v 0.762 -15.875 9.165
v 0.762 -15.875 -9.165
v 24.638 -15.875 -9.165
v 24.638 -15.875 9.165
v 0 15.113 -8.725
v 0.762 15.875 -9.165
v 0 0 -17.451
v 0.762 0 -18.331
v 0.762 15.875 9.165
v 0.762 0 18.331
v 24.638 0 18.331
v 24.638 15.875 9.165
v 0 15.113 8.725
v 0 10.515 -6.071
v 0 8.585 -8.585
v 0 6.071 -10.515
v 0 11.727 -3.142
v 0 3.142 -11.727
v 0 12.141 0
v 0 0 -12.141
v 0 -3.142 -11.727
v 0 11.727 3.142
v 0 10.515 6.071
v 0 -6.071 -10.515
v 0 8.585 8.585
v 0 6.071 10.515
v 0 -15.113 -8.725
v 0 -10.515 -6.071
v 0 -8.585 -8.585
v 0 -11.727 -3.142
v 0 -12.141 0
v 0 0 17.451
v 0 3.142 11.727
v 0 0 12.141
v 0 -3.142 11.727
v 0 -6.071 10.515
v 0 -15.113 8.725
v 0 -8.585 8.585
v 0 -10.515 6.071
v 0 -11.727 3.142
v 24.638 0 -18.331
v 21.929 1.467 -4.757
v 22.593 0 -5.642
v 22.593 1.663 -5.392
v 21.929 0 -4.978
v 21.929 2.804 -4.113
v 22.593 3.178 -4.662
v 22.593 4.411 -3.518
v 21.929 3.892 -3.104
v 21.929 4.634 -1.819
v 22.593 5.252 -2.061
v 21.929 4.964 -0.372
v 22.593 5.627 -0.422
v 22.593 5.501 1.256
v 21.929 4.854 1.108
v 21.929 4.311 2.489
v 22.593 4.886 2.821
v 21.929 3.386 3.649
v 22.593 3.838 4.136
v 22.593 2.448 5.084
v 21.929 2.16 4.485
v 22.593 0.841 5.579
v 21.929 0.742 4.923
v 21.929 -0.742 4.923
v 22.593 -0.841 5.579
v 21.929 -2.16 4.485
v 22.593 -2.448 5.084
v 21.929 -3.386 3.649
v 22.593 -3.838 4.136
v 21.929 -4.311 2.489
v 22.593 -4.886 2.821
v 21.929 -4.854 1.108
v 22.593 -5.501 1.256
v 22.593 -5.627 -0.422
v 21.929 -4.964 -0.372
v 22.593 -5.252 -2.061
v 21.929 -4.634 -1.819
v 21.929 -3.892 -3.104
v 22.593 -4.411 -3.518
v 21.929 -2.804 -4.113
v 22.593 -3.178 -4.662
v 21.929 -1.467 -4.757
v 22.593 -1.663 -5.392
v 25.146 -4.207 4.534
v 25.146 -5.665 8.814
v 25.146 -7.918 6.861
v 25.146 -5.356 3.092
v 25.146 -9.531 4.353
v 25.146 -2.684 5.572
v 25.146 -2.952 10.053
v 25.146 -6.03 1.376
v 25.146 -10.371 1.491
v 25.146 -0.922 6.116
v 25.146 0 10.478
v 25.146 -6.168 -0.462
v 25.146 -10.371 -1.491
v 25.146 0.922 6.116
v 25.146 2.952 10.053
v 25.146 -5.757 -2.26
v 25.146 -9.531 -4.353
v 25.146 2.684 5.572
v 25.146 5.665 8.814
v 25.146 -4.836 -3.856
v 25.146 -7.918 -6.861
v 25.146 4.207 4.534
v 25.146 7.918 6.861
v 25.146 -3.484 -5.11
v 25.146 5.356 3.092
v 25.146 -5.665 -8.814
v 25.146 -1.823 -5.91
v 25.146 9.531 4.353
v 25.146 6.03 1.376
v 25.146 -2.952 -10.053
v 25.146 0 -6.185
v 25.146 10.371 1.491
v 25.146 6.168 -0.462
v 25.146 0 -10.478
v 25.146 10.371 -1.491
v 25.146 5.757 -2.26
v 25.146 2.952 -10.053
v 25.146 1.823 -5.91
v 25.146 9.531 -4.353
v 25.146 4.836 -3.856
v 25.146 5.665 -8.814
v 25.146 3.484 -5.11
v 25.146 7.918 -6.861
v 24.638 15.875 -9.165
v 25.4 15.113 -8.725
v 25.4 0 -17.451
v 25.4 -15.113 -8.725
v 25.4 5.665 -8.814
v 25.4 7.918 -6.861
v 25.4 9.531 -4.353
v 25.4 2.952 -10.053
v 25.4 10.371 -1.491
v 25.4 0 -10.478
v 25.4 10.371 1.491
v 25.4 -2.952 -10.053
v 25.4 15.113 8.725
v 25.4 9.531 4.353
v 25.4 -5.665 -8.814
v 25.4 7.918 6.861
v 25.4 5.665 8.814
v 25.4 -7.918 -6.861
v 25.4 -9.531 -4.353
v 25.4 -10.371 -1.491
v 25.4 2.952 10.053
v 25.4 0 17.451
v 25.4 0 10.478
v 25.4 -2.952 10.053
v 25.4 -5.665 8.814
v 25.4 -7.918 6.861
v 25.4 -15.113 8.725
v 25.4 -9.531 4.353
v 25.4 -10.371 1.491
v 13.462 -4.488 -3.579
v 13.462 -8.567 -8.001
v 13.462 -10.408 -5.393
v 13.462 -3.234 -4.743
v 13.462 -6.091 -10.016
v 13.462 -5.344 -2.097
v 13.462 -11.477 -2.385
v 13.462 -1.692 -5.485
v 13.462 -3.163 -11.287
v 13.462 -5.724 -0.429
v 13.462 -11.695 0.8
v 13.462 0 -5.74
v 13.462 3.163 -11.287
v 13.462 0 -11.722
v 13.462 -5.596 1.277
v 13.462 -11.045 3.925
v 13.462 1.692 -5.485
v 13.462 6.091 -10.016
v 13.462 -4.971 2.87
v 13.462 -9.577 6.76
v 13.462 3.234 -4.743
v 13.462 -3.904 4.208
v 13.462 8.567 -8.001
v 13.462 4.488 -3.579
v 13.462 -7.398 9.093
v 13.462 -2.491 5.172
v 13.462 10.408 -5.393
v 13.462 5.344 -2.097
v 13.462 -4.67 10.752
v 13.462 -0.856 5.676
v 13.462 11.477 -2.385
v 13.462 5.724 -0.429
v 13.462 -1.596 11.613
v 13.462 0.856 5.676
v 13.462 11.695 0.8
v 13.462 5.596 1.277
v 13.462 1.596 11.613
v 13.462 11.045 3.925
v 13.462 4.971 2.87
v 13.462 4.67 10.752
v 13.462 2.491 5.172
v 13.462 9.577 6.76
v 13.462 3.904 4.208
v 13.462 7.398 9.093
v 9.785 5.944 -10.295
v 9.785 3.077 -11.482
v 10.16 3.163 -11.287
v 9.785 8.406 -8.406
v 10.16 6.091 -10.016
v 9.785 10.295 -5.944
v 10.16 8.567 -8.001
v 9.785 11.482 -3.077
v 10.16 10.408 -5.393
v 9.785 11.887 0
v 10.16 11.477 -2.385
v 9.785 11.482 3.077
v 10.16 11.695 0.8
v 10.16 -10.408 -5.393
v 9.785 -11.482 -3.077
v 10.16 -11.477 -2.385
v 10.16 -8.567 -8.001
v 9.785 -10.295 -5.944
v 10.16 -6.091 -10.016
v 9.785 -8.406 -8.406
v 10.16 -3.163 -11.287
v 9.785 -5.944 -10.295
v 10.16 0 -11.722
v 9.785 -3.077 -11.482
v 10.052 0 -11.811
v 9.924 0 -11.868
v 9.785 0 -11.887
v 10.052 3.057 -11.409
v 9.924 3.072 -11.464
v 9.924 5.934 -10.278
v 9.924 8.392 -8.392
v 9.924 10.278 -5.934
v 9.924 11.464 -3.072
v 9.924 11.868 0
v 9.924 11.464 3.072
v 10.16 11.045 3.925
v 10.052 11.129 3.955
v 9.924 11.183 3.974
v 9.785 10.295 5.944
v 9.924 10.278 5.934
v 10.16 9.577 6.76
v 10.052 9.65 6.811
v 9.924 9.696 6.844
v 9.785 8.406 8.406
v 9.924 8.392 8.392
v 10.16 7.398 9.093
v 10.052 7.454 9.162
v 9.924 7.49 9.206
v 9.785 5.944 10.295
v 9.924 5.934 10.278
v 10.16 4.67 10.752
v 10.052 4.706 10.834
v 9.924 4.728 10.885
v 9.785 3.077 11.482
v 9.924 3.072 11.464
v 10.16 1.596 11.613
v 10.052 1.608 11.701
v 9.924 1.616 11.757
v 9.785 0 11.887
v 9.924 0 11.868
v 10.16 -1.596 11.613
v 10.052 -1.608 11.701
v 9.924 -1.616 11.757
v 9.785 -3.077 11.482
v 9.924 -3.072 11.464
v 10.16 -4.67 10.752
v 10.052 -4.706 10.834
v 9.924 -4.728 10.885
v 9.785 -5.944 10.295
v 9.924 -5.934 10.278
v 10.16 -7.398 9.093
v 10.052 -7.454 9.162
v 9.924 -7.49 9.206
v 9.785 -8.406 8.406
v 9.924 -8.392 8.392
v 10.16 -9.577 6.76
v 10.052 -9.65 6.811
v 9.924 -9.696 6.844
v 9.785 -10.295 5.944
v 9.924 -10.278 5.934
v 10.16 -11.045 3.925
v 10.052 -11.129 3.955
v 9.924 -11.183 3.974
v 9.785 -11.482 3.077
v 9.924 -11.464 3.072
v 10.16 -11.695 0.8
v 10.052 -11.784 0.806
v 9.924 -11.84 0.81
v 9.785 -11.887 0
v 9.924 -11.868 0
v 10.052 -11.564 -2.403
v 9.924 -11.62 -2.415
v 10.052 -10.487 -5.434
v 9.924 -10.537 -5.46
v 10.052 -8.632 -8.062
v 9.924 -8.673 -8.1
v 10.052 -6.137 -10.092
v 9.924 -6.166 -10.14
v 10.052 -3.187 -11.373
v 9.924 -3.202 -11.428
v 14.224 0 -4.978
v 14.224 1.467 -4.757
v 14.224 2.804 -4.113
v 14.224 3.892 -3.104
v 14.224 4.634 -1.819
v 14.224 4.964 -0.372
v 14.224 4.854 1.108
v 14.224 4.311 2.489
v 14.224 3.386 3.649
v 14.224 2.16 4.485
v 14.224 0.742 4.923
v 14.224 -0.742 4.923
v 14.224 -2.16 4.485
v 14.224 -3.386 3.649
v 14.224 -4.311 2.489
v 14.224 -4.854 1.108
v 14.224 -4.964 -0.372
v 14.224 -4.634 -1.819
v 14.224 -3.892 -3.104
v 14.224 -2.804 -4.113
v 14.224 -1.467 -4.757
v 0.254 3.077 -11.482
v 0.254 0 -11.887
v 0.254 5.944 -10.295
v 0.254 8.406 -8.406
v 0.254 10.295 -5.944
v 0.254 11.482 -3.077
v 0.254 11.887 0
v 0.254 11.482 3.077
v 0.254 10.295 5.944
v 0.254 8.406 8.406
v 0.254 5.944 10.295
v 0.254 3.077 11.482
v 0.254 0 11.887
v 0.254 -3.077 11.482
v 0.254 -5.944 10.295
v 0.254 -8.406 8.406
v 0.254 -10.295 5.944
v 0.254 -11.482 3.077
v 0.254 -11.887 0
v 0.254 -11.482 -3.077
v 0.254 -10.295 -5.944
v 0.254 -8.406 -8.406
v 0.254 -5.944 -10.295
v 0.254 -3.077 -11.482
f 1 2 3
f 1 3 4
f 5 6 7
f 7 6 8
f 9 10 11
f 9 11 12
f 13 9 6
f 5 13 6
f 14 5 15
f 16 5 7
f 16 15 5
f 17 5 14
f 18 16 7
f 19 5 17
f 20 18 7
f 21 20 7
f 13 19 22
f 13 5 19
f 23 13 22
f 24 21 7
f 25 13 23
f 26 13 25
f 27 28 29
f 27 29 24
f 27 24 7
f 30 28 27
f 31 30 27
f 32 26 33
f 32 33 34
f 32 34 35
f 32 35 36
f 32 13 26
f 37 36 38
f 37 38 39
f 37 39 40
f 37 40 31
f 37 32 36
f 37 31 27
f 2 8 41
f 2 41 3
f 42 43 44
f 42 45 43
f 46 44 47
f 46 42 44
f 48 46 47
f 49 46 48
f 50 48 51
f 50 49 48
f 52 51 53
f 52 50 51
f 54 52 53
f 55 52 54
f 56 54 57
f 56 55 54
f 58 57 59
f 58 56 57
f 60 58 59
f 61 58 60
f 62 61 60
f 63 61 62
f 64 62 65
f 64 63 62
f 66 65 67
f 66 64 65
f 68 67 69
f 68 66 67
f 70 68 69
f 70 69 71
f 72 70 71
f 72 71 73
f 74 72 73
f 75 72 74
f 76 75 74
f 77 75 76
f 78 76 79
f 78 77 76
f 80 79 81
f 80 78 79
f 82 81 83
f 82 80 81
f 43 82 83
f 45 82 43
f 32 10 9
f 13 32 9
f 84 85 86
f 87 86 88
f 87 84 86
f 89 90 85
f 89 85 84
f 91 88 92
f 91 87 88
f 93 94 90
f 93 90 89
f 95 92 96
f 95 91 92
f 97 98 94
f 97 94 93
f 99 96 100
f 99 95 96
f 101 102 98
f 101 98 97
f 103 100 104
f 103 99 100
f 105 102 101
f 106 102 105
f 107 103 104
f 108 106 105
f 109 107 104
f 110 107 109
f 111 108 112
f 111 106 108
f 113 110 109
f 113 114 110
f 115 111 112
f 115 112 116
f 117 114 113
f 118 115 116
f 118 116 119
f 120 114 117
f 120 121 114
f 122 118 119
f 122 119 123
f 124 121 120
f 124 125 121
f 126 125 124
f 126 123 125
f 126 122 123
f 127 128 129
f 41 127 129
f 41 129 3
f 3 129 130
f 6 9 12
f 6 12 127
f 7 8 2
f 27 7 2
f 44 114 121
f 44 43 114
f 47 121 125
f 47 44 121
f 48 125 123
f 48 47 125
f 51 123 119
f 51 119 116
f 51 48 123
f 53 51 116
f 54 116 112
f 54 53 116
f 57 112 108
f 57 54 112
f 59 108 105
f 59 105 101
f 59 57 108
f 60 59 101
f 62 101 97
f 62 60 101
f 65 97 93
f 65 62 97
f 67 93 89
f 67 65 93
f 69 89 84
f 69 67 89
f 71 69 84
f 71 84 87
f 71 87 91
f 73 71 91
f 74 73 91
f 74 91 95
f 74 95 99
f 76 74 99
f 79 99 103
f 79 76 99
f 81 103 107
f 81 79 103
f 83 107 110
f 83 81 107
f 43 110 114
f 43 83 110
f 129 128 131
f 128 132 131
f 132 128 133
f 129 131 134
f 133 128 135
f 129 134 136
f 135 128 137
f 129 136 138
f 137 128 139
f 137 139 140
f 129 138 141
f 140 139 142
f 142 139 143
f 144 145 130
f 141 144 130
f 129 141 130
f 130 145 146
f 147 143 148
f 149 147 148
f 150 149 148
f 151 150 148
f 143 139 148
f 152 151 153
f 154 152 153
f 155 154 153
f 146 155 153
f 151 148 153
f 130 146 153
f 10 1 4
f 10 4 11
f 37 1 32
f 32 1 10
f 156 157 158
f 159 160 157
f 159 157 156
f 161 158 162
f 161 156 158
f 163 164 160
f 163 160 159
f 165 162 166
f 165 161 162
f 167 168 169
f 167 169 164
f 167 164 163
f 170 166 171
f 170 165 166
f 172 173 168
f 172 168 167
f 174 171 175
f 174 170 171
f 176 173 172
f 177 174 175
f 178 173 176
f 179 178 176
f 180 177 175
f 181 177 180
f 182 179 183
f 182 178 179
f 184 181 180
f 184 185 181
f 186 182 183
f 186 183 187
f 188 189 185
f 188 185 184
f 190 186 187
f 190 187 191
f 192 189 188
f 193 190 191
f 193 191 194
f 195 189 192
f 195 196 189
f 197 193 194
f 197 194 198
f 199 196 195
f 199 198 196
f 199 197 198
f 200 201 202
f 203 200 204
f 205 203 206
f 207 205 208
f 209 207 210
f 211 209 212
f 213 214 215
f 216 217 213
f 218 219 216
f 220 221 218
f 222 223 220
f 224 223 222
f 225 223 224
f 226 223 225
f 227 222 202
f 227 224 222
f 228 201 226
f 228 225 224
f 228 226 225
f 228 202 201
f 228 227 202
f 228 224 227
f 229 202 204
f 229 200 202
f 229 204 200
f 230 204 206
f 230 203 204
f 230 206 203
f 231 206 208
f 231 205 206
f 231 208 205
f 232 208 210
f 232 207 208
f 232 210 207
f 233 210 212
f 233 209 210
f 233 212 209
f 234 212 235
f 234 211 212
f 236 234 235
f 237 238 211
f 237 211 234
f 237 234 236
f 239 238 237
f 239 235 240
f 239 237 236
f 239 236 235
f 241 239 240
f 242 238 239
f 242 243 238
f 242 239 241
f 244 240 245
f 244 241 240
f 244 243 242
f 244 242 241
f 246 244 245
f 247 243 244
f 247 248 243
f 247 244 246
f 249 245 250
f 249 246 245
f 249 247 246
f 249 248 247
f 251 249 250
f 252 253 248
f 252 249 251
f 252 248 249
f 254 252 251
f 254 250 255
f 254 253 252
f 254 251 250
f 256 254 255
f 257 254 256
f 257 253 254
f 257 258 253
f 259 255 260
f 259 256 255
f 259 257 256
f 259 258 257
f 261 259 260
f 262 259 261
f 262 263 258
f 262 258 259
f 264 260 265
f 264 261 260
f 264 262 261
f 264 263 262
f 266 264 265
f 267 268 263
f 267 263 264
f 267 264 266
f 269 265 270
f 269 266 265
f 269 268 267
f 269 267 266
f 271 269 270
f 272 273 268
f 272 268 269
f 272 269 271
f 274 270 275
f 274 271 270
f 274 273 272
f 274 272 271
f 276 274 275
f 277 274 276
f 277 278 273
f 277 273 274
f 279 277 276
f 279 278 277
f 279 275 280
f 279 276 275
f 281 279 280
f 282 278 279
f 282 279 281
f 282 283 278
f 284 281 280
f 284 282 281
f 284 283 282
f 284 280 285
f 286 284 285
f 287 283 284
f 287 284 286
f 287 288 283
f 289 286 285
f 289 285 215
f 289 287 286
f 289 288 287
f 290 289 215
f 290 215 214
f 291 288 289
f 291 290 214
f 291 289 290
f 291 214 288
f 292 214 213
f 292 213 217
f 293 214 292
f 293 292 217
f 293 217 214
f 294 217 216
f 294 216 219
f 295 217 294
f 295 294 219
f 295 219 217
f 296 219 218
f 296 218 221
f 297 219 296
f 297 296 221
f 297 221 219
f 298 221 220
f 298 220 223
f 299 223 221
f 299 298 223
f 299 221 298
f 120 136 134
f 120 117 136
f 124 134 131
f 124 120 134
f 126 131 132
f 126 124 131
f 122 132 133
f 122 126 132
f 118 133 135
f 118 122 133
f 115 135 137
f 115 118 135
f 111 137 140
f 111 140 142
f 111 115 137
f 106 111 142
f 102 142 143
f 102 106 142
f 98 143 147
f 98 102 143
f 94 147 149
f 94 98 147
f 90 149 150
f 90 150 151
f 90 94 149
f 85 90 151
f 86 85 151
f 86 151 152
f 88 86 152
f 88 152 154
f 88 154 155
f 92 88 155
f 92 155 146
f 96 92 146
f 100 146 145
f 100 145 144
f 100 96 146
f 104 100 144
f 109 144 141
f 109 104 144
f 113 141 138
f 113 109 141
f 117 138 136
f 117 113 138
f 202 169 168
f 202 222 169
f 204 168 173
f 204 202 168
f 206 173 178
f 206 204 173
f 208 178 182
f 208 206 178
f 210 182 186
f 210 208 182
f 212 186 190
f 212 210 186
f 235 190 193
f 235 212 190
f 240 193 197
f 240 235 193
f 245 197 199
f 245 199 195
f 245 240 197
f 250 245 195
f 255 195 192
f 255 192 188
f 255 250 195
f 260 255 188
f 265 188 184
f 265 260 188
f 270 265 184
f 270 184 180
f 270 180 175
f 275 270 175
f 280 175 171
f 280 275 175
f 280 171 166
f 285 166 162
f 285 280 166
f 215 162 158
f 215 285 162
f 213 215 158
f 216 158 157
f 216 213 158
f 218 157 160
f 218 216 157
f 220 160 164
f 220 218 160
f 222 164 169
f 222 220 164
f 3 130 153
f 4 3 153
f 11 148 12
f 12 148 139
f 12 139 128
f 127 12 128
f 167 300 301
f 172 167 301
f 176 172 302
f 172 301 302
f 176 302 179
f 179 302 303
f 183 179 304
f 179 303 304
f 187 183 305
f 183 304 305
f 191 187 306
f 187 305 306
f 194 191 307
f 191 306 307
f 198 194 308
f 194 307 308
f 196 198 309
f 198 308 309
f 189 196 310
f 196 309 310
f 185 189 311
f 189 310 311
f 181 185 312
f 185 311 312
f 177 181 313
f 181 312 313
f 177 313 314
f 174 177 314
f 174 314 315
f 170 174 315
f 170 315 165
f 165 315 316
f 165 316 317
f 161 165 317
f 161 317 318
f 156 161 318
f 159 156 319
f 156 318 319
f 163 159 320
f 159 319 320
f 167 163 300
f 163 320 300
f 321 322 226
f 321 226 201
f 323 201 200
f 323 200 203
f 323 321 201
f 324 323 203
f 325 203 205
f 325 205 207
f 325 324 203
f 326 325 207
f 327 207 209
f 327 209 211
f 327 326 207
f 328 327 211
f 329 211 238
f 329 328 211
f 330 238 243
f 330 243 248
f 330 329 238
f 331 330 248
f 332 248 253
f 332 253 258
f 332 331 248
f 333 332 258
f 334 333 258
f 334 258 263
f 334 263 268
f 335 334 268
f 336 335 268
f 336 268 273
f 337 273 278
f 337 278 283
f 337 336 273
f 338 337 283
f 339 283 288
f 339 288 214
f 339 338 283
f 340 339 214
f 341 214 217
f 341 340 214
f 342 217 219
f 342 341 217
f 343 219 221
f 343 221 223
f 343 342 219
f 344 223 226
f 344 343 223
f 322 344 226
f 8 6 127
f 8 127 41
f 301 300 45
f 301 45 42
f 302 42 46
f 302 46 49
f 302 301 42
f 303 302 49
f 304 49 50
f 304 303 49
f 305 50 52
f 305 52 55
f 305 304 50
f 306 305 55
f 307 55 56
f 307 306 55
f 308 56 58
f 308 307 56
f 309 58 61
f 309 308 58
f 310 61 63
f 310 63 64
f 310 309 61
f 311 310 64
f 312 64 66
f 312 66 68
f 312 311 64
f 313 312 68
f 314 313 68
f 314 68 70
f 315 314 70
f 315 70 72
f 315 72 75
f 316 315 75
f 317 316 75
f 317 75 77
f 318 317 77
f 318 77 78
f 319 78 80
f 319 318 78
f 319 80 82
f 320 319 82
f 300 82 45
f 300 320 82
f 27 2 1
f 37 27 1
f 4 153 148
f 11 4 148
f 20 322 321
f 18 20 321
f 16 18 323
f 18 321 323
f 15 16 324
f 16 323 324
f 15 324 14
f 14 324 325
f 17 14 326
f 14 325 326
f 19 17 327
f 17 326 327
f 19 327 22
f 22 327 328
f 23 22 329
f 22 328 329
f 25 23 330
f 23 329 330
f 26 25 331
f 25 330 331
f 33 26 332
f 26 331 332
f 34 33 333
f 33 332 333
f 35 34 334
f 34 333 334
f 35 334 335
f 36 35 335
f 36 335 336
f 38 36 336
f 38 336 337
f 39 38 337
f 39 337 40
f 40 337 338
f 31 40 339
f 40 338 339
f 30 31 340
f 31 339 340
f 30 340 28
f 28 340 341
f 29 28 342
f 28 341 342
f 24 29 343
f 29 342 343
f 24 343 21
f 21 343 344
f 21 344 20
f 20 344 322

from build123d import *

# Parameters (mm, degrees)
EXTRUDE1_DEPTH = 25.4
CHAMFER1_SIZE  = 0.254
CHAMFER2_SIZE  = 0.762
CHAMFER3_SIZE  = 0.762
CHAMFER4_SIZE  = 0.762


with BuildPart() as part:
    # Sketch1 → Extrude1 (new body)
    with BuildSketch(Plane(origin=(0, 0, 0), x_dir=(0, -1, 0), z_dir=(-1, 0, 0))):
        Polygon((15.875, 9.165435523), (0, 18.330871047), (-15.875, 9.165435523), (-15.875, -9.165435523), (0, -18.330871047), (15.875, -9.165435523), align=None)
    extrude(amount=-EXTRUDE1_DEPTH)

    # Sketch2 → Cut-Revolve1 (revolve, cut)
    with BuildSketch(Plane.XY, mode=Mode.PRIVATE) as cut_revolve1_sk:
        with BuildLine():
            Line((0, 11.8872), (0, 0))
            Line((0, 0), (25.4, 0))
            Line((25.4, 0), (25.4, 10.4775))
            Line((25.4, 10.4775), (25.146, 10.4775))
            Line((25.146, 10.4775), (25.146, 6.1849))
            Line((25.146, 6.1849), (22.5933, 5.642306865))
            Line((22.5933, 5.642306865), (21.929393135, 4.9784))
            Line((21.929393135, 4.9784), (13.462, 4.9784))
            Line((13.462, 4.9784), (13.462, 11.7221))
            Line((13.462, 11.7221), (10.16, 11.7221))
            ThreePointArc((10.16, 11.7221), (9.989969941, 11.844096333), (9.785188594, 11.8872))
            Line((9.785188594, 11.8872), (0, 11.8872))
        make_face()
    revolve(cut_revolve1_sk.sketch.rotate(Axis((0, 0, 0), (1, 0, 0)), 270), axis=Axis((0, 0, 0), (1, 0, 0)), mode=Mode.SUBTRACT)  # turned: the seam where the file's is

    # Chamfer1
    chamfer1_edges = [part.edges().sort_by_distance(p)[0] for p in [
        (0, 0, 11.8872),
    ]]
    chamfer(chamfer1_edges, length=CHAMFER1_SIZE)

    # Chamfer2
    chamfer2_edges = [part.edges().sort_by_distance(p)[0] for p in [
        (13.462, 0, 4.9784),
    ]]
    chamfer(chamfer2_edges, length=CHAMFER2_SIZE)

    # Chamfer3
    chamfer3_edges = [part.edges().sort_by_distance(p)[0] for p in [
        (0, -7.9375, -13.748153285),
        (0, 7.9375, -13.748153285),
        (0, 15.875, 0),
        (0, 7.9375, 13.748153285),
        (0, -7.9375, 13.748153285),
        (0, -15.875, 0),
    ]]
    chamfer(chamfer3_edges, length=CHAMFER3_SIZE)

    # Chamfer4
    chamfer4_edges = [part.edges().sort_by_distance(p)[0] for p in [
        (25.4, 7.9375, 13.748153285),
        (25.4, 15.875, 0),
        (25.4, 7.9375, -13.748153285),
        (25.4, -7.9375, -13.748153285),
        (25.4, -15.875, 0),
        (25.4, -7.9375, 13.748153285),
    ]]
    chamfer(chamfer4_edges, length=CHAMFER4_SIZE)


solid = part.part
